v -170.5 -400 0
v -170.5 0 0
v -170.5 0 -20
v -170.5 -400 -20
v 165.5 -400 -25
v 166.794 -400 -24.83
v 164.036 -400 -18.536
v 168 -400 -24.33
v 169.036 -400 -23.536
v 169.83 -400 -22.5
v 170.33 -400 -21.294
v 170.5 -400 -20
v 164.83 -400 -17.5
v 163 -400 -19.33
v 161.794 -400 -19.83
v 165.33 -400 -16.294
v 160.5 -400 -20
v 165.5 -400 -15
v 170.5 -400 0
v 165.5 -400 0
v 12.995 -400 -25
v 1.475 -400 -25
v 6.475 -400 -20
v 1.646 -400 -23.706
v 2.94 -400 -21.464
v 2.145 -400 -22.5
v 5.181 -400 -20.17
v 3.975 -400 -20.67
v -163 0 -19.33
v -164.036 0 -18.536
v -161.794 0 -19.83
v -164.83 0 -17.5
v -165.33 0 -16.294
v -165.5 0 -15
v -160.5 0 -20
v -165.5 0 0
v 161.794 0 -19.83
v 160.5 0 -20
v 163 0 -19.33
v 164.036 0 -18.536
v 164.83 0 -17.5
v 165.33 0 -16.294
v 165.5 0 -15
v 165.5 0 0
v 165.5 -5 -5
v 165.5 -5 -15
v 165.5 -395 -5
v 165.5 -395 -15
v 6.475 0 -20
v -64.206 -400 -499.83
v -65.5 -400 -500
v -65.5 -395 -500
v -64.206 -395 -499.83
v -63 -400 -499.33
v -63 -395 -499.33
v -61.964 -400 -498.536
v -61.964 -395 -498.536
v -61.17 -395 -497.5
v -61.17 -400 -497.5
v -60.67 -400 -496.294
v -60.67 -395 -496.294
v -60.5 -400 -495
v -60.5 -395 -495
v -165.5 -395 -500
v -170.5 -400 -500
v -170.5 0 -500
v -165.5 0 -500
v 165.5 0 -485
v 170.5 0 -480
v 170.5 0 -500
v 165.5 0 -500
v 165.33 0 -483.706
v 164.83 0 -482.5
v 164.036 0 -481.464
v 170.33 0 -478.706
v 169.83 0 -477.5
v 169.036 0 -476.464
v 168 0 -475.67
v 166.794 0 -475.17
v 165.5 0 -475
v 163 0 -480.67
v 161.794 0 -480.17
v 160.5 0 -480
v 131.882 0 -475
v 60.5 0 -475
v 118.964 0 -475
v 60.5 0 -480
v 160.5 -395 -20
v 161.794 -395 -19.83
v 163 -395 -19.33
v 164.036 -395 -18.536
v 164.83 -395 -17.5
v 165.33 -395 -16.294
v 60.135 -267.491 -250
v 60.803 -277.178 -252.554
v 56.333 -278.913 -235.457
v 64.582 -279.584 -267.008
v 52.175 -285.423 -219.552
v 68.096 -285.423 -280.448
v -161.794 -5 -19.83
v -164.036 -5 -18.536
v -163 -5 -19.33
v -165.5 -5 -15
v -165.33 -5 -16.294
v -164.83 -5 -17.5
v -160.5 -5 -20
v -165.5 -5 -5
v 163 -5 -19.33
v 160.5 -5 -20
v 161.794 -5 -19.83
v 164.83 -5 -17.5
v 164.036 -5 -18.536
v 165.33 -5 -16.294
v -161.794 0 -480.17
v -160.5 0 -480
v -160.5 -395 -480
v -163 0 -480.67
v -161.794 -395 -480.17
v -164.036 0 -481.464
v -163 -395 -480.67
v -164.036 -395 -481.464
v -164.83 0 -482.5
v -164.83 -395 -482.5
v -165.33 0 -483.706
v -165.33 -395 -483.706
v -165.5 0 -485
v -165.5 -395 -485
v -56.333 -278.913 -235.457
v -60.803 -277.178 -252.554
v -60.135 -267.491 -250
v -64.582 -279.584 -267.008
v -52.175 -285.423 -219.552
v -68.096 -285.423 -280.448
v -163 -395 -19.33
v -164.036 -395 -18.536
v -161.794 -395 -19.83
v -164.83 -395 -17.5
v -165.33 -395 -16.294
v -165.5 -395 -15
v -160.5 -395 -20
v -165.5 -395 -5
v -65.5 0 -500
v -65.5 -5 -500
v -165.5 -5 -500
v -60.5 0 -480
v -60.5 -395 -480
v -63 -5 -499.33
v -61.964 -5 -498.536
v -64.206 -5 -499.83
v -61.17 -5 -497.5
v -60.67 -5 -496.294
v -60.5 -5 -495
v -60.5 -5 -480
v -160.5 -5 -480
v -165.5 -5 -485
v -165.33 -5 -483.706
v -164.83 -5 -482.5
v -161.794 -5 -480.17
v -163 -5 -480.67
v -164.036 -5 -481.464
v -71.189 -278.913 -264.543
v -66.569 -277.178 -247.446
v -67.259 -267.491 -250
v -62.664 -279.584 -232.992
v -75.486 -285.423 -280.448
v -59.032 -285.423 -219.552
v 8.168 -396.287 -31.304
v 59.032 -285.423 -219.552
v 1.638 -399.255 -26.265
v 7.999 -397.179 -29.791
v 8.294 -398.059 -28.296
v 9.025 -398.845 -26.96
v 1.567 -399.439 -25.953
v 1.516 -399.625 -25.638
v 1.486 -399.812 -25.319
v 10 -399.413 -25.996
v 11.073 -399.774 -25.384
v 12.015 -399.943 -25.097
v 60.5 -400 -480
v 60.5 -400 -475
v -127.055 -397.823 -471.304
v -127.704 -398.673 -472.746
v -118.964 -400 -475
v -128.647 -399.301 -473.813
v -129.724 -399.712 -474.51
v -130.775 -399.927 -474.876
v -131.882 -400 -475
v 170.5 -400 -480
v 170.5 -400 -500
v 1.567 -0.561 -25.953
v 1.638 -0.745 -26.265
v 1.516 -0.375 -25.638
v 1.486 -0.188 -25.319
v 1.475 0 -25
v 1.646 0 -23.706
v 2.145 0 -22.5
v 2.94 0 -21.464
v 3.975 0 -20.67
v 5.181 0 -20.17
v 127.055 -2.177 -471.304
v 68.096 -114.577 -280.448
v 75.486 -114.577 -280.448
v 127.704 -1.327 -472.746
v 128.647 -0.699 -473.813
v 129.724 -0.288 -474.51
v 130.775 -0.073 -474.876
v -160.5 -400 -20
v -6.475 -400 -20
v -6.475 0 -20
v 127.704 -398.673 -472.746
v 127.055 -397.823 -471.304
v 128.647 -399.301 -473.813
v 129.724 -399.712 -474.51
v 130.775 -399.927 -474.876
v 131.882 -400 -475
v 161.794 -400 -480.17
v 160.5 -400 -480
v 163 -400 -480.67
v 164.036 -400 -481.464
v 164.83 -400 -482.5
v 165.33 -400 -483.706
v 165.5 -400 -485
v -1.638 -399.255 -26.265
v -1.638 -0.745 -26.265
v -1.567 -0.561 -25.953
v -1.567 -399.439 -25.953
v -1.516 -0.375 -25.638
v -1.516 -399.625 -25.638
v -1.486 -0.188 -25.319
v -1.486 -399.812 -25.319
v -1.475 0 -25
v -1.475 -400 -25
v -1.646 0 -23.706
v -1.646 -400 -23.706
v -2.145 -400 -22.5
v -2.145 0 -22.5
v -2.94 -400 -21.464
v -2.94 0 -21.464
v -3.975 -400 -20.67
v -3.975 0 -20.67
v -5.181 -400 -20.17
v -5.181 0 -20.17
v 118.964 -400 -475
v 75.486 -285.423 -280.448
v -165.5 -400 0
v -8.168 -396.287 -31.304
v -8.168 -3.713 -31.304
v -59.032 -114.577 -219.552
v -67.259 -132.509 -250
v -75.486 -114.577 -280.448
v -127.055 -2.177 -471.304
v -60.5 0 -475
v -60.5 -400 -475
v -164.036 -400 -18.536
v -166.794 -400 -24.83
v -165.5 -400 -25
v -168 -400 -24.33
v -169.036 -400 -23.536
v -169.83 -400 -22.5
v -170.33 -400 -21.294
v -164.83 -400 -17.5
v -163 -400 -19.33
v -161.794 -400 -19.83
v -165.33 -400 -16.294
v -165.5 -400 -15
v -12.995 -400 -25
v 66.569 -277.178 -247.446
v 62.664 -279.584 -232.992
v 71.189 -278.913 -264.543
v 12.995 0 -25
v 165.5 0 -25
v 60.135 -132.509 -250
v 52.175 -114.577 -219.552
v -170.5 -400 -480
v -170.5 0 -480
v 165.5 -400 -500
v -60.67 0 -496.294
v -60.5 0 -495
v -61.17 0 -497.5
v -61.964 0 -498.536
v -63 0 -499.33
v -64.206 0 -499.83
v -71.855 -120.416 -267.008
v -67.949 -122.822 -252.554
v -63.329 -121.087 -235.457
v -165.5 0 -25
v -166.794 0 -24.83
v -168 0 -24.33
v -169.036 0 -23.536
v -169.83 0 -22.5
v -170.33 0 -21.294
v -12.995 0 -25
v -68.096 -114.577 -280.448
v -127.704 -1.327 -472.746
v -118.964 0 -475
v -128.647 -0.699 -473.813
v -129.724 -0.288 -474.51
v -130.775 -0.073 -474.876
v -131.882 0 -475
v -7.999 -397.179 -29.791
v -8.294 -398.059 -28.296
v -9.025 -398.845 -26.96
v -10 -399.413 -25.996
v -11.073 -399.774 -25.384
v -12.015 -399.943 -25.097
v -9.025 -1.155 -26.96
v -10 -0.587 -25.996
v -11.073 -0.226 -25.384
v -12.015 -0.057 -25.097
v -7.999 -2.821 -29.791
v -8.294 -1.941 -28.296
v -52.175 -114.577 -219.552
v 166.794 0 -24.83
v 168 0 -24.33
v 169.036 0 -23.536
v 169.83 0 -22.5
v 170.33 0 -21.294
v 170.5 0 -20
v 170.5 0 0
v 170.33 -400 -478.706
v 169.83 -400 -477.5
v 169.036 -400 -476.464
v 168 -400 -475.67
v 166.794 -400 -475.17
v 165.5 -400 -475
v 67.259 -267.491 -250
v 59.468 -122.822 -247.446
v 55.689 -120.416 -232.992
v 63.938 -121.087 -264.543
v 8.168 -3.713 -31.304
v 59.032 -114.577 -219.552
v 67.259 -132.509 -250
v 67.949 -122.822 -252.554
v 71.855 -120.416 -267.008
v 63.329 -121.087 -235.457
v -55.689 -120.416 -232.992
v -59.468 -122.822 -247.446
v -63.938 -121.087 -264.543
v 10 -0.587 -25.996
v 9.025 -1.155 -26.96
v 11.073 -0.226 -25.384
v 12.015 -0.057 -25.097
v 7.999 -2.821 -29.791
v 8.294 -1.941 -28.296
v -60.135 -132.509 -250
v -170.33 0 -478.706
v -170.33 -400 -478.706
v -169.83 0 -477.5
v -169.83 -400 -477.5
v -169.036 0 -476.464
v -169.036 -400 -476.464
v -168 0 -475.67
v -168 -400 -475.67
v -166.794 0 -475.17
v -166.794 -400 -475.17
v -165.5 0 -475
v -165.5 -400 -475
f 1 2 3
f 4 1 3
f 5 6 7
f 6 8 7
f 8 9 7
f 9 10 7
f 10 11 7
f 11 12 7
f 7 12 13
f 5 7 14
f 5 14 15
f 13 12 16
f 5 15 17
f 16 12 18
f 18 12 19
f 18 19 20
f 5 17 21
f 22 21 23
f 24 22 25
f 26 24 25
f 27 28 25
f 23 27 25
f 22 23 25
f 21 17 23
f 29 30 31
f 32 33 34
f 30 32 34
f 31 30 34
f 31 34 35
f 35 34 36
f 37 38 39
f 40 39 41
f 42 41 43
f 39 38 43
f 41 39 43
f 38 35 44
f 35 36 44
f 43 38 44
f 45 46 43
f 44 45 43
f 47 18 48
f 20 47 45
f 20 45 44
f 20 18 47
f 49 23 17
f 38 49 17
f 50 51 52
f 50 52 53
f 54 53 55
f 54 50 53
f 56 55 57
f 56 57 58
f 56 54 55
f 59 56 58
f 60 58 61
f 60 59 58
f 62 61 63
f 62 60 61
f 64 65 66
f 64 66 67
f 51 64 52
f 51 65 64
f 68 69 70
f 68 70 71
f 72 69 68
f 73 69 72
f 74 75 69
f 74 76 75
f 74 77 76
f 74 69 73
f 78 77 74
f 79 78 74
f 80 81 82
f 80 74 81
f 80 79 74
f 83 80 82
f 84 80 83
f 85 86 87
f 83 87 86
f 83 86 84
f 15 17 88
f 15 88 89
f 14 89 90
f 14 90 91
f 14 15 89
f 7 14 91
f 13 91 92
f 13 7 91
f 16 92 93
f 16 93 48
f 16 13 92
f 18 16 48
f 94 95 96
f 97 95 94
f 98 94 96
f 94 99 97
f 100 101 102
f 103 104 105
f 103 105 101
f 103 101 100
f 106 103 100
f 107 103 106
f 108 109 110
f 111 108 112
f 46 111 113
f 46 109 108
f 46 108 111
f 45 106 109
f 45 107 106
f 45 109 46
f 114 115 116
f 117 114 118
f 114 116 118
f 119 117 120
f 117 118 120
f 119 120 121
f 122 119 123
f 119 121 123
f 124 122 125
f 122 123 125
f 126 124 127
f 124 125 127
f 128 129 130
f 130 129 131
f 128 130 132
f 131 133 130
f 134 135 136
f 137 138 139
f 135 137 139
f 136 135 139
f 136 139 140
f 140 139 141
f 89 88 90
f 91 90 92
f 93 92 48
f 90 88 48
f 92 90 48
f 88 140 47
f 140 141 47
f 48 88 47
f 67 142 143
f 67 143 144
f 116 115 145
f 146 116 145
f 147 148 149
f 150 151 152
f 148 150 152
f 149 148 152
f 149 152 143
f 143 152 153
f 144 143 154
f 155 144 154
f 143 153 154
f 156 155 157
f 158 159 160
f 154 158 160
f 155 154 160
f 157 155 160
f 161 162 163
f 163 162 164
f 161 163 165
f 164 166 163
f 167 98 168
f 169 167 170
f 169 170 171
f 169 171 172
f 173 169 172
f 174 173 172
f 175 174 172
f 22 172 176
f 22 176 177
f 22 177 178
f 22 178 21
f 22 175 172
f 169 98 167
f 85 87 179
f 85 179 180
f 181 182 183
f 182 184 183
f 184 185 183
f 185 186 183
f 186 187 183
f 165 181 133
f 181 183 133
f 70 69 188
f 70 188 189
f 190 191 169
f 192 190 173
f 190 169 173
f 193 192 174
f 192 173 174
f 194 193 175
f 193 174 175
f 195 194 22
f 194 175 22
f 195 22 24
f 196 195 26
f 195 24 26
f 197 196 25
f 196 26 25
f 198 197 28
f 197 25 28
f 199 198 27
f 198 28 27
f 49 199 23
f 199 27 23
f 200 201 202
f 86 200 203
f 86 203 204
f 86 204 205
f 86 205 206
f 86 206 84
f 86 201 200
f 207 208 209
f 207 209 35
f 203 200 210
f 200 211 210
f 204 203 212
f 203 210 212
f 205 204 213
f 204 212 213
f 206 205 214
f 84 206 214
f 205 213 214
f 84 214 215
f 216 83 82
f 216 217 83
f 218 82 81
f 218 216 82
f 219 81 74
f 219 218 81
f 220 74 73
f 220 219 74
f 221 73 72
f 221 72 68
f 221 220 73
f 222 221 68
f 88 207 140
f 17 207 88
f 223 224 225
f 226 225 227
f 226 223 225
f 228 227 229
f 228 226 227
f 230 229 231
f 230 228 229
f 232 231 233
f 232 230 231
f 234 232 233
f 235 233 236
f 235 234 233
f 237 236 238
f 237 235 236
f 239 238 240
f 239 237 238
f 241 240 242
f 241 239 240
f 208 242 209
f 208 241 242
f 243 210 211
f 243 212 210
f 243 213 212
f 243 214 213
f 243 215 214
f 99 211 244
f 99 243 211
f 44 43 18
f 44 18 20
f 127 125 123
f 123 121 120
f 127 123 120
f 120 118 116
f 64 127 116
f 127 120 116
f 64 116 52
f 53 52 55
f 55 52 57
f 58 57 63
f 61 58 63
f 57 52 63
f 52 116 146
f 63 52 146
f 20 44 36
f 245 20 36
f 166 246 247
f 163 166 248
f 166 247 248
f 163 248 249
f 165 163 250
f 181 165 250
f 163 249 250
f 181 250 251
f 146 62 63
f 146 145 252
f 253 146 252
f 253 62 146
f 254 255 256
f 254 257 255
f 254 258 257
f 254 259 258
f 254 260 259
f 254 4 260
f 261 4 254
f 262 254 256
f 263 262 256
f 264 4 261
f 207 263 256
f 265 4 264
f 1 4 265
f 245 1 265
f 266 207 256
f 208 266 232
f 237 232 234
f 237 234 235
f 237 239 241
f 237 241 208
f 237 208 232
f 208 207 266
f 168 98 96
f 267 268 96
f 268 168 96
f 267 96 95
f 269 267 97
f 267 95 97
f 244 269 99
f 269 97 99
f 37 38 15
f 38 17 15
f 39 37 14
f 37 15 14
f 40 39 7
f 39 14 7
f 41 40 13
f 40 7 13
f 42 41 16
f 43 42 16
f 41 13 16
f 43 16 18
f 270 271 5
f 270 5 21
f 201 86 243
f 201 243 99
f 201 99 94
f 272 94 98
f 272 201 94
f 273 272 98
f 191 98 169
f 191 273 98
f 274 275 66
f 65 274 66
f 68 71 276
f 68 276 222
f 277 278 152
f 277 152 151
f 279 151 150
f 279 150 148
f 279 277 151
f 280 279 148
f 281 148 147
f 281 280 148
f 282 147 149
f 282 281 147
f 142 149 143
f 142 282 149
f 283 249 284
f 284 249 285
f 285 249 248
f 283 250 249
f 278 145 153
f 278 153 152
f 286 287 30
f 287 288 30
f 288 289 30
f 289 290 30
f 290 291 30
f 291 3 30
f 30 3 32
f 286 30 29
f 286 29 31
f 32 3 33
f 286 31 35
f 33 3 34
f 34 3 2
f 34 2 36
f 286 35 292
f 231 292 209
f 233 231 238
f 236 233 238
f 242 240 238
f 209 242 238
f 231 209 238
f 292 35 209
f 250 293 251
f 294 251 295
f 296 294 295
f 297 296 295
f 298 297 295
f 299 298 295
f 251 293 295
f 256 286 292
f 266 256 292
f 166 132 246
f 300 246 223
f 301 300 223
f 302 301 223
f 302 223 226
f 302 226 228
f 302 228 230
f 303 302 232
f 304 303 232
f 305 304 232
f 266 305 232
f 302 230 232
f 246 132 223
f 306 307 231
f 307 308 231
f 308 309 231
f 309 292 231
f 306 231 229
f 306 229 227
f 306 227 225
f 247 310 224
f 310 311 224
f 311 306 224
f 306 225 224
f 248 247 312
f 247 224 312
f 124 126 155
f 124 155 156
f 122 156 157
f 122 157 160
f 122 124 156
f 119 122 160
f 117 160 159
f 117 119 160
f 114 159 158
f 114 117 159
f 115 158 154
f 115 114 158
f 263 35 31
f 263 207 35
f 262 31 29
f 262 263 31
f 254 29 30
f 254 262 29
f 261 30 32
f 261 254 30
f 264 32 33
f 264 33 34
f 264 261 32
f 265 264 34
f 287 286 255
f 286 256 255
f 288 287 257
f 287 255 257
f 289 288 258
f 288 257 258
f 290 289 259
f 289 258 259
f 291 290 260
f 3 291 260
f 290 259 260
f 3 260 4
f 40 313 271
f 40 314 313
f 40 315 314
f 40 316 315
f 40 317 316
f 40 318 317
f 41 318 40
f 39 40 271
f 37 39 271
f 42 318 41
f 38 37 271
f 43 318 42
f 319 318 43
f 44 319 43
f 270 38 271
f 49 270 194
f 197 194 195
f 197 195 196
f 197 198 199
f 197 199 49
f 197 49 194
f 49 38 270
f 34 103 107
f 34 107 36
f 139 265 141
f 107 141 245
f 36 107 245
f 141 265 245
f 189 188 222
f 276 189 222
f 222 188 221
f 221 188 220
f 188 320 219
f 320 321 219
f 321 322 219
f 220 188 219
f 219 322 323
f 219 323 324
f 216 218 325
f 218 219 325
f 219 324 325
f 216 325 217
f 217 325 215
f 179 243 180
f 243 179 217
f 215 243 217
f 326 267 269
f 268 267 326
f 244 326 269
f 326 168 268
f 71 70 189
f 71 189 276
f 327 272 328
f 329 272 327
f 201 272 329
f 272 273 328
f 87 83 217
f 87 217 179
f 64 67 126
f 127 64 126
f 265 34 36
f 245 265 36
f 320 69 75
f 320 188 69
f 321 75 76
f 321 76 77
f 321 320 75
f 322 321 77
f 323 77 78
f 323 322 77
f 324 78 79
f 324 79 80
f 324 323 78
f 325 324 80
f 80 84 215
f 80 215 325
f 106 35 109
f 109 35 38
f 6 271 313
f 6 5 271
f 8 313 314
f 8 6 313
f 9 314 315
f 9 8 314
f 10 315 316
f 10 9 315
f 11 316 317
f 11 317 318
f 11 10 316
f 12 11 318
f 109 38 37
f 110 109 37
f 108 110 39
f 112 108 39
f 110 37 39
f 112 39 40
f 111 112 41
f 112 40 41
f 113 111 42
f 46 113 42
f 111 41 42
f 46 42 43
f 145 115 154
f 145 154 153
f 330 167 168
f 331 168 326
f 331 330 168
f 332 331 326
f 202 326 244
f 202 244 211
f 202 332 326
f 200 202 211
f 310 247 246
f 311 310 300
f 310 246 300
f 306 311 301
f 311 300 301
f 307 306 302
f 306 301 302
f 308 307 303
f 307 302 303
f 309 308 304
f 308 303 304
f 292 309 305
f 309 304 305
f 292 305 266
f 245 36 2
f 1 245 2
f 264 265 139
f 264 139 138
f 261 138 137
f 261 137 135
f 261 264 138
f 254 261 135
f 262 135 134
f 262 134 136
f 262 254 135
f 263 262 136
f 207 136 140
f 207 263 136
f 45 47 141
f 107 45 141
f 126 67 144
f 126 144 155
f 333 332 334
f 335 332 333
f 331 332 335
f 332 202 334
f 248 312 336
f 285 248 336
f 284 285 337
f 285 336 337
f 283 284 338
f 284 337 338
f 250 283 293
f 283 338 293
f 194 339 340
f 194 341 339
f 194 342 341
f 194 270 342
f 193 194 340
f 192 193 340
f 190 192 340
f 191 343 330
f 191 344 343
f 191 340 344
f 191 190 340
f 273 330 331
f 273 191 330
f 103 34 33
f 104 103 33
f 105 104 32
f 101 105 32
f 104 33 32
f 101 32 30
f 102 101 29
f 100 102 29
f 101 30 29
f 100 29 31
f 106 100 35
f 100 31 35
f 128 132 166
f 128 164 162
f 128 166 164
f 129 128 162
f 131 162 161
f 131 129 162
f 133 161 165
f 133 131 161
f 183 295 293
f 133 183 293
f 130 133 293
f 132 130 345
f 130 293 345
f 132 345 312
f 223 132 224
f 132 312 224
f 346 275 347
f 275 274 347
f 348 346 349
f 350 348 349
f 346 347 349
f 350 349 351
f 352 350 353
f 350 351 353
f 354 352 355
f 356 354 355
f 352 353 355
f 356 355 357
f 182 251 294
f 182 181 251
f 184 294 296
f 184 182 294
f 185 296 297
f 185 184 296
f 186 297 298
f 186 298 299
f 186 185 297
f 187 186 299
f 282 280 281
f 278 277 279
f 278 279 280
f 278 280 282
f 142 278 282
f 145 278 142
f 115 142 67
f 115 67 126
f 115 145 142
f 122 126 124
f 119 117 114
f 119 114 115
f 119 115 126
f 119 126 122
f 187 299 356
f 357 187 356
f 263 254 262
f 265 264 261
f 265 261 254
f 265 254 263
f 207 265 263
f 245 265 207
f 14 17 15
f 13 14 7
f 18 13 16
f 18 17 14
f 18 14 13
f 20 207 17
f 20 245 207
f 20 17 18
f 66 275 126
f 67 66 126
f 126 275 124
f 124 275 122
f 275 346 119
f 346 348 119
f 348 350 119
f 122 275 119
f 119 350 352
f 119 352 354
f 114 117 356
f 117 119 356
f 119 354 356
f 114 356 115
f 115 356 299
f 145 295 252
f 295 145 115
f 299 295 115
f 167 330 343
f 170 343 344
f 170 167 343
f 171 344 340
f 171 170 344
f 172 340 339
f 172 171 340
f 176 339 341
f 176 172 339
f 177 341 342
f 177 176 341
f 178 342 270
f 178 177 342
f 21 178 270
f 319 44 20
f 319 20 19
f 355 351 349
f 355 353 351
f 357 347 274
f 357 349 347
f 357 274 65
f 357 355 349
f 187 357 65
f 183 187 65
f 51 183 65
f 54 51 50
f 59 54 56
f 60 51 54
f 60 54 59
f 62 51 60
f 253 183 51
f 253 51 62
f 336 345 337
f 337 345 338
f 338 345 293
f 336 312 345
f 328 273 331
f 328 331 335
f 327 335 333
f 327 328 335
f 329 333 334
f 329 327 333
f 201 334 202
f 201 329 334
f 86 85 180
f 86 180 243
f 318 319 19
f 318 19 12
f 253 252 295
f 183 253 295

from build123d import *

# Parameters (mm, degrees)
F2_DEPTH     = 400
F4_DEPTH     = 784
F5_R         = 5
F6_T4_DEPTH  = 183.8018686822
F6_T10_DEPTH = 183.8018686822
F9_DEPTH     = 5
F11_DEPTH    = 5
F13_W        = 331
F13_H        = 5
F14_DEPTH    = 390
F16_DEPTH    = 5
F18_DEPTH    = 5


# Not quite as in the source:
# - a fillet or chamfer that OpenCascade refuses, or shapes differently, is made with other operations: its cross-section is extruded or revolved along the edge and cut away or added


with BuildPart() as f2:
    # F1 (on Front) → F2 (new body)
    with BuildSketch(Plane.XZ):
        Polygon((-118.9635416667, -475), (0, -20), (-165.5, -20), (-165.5, 0), (-170.5, 0), (-170.5, -25), (-6.4646408415, -25), (-128.0534928563, -475), (-170.5, -475), (-170.5, -500), (-165.5, -500), (-165.5, -480), (-60.5, -480), (-60.5, -475), align=None)
    extrude(amount=F2_DEPTH)

    # F3 (on Right) → F4 (cut)
    with BuildSketch(Plane.YZ):
        Polygon((162.0724052191, -25), (0, -25), (-132.508663875, -250), (0, -475), (162.0724052191, -475), align=None)
        Polygon((-267.491336125, -250), (-400, -25), (-562.0724052191, -25), (-562.0724052191, -475), (-400, -475), align=None)
    extrude(amount=-F4_DEPTH, mode=Mode.SUBTRACT)

    # F5
    f5_edges = [f2.edges().sort_by_distance(p)[0] for p in [
        (-6.464641, -200, -25),
        (0, -200, -20),
        (-170.5, -200, -25),
        (-165.5, -200, -20),
        (-128.053493, -200, -475),
        (-170.5, -200, -475),
        (-165.5, -200, -480),
    ]]
    fillet(f5_edges, radius=F5_R)

    # F6: fillet of radius 60 on 2 edges, made by hand


with BuildPart() as f6_tool2:
    # F6_s3 → F6_t4 (new body)
    with BuildSketch(Plane.YZ.offset(28.2036925833)):
        with BuildLine():
            ThreePointArc((-114.5771279689, -219.5522129582), (-122.8767192253, -250), (-114.5771279689, -280.4477870418))
            Line((-114.5771279689, -280.4477870418), (-132.508663875, -250))
            Line((-132.508663875, -250), (-114.5771279689, -219.5522129582))
        make_face()
    extrude(amount=-F6_T4_DEPTH)

    split(bisect_by=Plane(origin=(4.8945715066, 0, -1.2797265085), x_dir=(0, 1, 0), z_dir=(-0.9674779969, 0, 0.2529551846)), keep=Keep.TOP)

    split(bisect_by=Plane(origin=(0.2705438763, 0, -0.0731002652), x_dir=(0, 1, 0), z_dir=(0.9653810975, 0, -0.2608435098)), keep=Keep.TOP)


with BuildPart() as f2_1:
    add(f2.part)

    # F6_t1: union F6_tool2
    add(f6_tool2.part)


with BuildPart() as f6_tool8:
    # F6_s9 → F6_t10 (new body)
    with BuildSketch(Plane.YZ.offset(28.2036925833)):
        with BuildLine():
            ThreePointArc((-285.4228720311, -219.5522129582), (-277.1232807747, -250), (-285.4228720311, -280.4477870418))
            Line((-285.4228720311, -280.4477870418), (-267.491336125, -250))
            Line((-267.491336125, -250), (-285.4228720311, -219.5522129582))
        make_face()
    extrude(amount=-F6_T10_DEPTH)

    split(bisect_by=Plane(origin=(4.8945715066, 0, -1.2797265085), x_dir=(0, 1, 0), z_dir=(-0.9674779969, 0, 0.2529551846)), keep=Keep.TOP)

    split(bisect_by=Plane(origin=(0.2705438763, 0, -0.0731002652), x_dir=(0, 1, 0), z_dir=(0.9653810975, 0, -0.2608435098)), keep=Keep.TOP)


with BuildPart() as f2_2:
    add(f2_1.part)

    # F6_t7: union F6_tool8
    add(f6_tool8.part)


with BuildPart() as f7_1:
    # F7: instance of F2
    add(f2_2.part.mirror(Plane.YZ))


with BuildPart() as f9:
    # F8 (on Front) → F9 (new body)
    with BuildSketch(Plane.XZ):
        with BuildLine():
            Line((165.5, 0), (-165.5, 0))
            Line((-165.5, 0), (-165.5, -15))
            ThreePointArc((-165.5, -15), (-164.0355339059, -18.5355339059), (-160.5, -20))
            Line((-160.5, -20), (-6.4753678563, -20))
            Line((-6.4753678563, -20), (160.5, -20))
            ThreePointArc((160.5, -20), (164.0355339059, -18.5355339059), (165.5, -15))
            Line((165.5, -15), (165.5, 0))
        make_face()
    extrude(amount=F9_DEPTH)



with BuildPart() as f11:
    # F10 (on face) → F11 (new body)
    with BuildSketch(Plane.XZ.offset(400)):
        with BuildLine():
            Line((165.5, 0), (-165.5, 0))
            Line((-165.5, 0), (-165.5, -15))
            ThreePointArc((-165.5, -15), (-164.0355339059, -18.5355339059), (-160.5, -20))
            Line((-160.5, -20), (-6.4753678563, -20))
            Line((-6.4753678563, -20), (160.5, -20))
            ThreePointArc((160.5, -20), (164.0355339059, -18.5355339059), (165.5, -15))
            Line((165.5, -15), (165.5, 0))
        make_face()
    extrude(amount=-F11_DEPTH)


with BuildPart() as f9_1:
    add(f9.part)

    add(f11.part)  # F14 merges F11
    # F13 (on face) → F14 (join, through all)
    with BuildSketch(Plane(origin=(0, -395, 0), x_dir=(-1, 0, 0), z_dir=(0, 1, 0))):
        with Locations((0, -2.5)):
            Rectangle(F13_W, F13_H)
    extrude(amount=F14_DEPTH)


with BuildPart() as f16:
    # F15 (on face) → F16 (new body)
    with BuildSketch(Plane(origin=(0, 0, 0), x_dir=(-1, 0, 0), z_dir=(0, 1, 0))):
        with BuildLine():
            ThreePointArc((165.5, -485), (164.0355339059, -481.4644660941), (160.5, -480))
            Line((160.5, -480), (60.5, -480))
            Line((60.5, -480), (60.5, -495))
            ThreePointArc((60.5, -495), (61.9644660941, -498.5355339059), (65.5, -500))
            Line((65.5, -500), (165.5, -500))
            Line((165.5, -500), (165.5, -485))
        make_face()
    extrude(amount=-F16_DEPTH)


with BuildPart() as f2_3:
    add(f2_2.part)

    # F17 (on face) → F18 (join)
    with BuildSketch(Plane.XZ.offset(400)):
        with BuildLine():
            ThreePointArc((-160.5, -480), (-164.0355339059, -481.4644660941), (-165.5, -485))
            Line((-165.5, -485), (-165.5, -500))
            Line((-165.5, -500), (-65.5, -500))
            ThreePointArc((-65.5, -500), (-61.9644660941, -498.5355339059), (-60.5, -495))
            Line((-60.5, -495), (-60.5, -480))
            Line((-60.5, -480), (-160.5, -480))
        make_face()
    extrude(amount=-F18_DEPTH)


solid = Compound([f7_1.part, f9_1.part, f16.part, f2_3.part])
